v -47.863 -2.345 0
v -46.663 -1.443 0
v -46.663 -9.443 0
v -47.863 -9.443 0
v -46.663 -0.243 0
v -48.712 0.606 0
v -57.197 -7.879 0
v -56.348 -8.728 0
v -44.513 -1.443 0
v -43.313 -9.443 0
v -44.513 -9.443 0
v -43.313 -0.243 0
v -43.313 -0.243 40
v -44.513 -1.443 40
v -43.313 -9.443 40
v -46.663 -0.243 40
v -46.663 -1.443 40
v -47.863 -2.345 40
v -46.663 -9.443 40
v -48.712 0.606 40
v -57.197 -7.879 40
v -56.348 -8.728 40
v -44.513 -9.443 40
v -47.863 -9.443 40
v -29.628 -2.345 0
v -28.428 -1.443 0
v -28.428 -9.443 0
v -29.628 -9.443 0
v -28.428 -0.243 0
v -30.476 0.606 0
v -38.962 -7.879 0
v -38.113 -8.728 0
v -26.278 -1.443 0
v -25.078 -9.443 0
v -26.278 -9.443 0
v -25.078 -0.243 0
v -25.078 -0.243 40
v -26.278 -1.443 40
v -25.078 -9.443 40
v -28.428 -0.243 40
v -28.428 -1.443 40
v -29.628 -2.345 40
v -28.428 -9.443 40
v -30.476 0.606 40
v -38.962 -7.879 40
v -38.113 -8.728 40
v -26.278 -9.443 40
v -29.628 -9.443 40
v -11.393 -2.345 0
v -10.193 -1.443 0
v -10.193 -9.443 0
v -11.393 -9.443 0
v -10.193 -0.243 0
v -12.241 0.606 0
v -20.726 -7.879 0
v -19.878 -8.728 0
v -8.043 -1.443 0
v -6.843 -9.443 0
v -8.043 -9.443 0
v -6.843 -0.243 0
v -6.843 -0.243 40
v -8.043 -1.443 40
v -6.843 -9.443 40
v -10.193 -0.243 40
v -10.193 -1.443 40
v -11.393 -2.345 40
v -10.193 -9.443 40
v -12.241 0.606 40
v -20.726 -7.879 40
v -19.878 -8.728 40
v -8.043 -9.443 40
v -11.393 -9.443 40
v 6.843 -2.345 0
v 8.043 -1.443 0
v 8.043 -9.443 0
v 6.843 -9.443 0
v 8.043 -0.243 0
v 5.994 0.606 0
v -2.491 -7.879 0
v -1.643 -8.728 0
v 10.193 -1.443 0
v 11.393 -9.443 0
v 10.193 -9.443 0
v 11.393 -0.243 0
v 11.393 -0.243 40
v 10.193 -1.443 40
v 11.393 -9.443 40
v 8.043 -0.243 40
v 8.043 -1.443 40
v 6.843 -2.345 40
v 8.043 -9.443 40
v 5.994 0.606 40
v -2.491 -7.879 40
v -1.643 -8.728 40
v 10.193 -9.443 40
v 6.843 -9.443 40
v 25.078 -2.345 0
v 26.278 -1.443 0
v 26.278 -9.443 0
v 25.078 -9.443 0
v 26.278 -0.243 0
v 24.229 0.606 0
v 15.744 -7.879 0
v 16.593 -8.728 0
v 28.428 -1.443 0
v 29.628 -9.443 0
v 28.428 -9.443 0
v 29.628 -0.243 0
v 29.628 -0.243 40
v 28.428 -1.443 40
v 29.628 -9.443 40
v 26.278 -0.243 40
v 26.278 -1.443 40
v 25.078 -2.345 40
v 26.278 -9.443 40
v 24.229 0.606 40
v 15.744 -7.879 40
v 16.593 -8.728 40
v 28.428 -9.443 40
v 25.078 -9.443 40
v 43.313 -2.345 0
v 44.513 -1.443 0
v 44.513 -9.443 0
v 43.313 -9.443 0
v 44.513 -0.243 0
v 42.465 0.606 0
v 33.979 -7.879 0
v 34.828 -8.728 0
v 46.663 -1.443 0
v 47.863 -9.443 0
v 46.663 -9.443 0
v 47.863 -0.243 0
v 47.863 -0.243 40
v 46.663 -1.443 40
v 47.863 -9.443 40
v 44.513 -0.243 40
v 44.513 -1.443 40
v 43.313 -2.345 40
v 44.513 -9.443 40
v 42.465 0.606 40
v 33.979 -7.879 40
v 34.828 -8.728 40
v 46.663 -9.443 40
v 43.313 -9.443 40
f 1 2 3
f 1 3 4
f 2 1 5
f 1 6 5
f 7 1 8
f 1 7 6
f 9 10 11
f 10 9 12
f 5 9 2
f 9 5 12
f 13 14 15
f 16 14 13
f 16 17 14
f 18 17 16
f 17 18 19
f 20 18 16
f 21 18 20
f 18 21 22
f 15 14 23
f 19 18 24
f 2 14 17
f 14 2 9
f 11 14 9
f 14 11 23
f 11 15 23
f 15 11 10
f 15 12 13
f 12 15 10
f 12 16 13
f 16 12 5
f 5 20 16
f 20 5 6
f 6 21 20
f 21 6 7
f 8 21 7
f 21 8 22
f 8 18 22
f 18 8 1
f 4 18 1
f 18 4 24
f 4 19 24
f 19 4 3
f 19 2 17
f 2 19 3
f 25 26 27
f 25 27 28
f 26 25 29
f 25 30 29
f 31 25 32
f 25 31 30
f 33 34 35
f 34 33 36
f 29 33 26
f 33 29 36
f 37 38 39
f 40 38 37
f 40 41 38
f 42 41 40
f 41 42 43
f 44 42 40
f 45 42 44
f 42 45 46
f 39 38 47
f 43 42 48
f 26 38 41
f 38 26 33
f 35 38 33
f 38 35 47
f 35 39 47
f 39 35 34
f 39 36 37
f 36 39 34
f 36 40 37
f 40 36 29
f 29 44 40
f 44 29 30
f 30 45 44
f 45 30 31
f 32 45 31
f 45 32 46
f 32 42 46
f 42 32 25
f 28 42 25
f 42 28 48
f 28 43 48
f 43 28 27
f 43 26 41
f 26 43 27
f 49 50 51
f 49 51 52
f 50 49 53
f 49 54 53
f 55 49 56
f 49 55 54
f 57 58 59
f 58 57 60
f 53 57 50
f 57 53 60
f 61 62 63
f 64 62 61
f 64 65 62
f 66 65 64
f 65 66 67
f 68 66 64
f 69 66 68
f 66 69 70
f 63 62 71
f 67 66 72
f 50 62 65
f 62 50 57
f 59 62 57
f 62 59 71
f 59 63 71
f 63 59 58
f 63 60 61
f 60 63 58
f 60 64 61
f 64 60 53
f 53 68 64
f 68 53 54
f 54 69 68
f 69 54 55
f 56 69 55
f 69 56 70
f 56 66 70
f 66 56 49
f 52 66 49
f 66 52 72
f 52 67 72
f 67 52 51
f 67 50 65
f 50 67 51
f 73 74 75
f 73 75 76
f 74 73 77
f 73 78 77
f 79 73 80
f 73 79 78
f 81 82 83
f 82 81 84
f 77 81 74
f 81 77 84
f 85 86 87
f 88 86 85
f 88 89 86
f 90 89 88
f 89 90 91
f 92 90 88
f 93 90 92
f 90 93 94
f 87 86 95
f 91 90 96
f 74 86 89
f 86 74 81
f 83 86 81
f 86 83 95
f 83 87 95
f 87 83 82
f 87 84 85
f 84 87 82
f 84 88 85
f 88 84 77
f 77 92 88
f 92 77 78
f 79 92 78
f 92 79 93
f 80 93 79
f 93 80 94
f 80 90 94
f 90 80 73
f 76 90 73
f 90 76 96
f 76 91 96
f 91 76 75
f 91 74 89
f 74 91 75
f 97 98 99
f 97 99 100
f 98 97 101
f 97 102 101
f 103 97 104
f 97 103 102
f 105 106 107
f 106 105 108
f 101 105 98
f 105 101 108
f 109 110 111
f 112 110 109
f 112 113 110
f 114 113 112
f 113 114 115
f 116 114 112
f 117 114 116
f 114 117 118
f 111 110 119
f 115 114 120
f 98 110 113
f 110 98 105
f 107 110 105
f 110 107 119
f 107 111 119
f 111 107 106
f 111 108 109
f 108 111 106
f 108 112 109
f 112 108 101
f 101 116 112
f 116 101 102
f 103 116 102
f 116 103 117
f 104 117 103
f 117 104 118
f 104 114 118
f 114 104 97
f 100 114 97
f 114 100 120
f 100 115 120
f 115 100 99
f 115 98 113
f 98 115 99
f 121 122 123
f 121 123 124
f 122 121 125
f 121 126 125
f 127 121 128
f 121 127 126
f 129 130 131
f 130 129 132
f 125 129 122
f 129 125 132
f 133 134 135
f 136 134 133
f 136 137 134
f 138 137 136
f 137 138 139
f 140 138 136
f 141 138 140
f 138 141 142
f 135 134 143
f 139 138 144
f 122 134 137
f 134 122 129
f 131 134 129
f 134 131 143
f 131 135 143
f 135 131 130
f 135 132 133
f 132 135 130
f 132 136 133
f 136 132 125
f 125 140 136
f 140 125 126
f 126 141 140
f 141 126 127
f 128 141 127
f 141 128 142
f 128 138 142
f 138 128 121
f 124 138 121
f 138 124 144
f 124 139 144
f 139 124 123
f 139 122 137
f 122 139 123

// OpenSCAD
// The Drawer Dividers V3 – Label clip
// Slides onto the top edge of a wall: write on it, add a sticker or engrave a text.
use <lib/drawer_divider.scad>

/* [Part] */
// Text engraved into the face ("" = blank, write on it)
Clip_Text = "";
// Clip width along the wall (mm)
Clip_Width = 40; // [15:1:120]
// Height of the slanted face (mm)
Face_Height = 12; // [6:0.5:30]
// Angle of the face (degrees, 0 = upright)
Face_Angle = 45; // [0:5:80]
// How far the clip reaches down the wall (mm)
Grip_Depth = 8; // [3:0.5:20]
// Text size (mm)
Text_Size = 5; // [2:0.5:15]
// How many copies on the plate
Count = 6; // [1:1:40]
// Gap between copies (mm)
Spacing = 4; // [1:1:20]

/* [System] */
// Exact thickness of your printed walls (mm)
Wall_Thickness = 2.0; // [0.8:0.1:10]
// Material thickness of the clip (mm)
Clip_Wall = 1.2; // [0.6:0.1:3]
// Extra room for the wall – smaller = tighter (mm)
Clip_Fit = 0.15; // [0:0.05:0.6]

/* [Hidden] */
$fn = 32;

P = dd_profile(wall_t = Wall_Thickness);
sz = dd_label_clip_size(P, Face_Height, Face_Angle, Grip_Depth, Clip_Wall);
dd_grid(Count, sz[0] + Spacing, sz[1] + Spacing)
    translate([0, Grip_Depth - sz[1] / 2, 0])
        dd_label_clip(Clip_Width, P, face = Face_Height, angle = Face_Angle, grip = Grip_Depth,
                      wall = Clip_Wall, fit = Clip_Fit, label = Clip_Text, text_size = Text_Size);
